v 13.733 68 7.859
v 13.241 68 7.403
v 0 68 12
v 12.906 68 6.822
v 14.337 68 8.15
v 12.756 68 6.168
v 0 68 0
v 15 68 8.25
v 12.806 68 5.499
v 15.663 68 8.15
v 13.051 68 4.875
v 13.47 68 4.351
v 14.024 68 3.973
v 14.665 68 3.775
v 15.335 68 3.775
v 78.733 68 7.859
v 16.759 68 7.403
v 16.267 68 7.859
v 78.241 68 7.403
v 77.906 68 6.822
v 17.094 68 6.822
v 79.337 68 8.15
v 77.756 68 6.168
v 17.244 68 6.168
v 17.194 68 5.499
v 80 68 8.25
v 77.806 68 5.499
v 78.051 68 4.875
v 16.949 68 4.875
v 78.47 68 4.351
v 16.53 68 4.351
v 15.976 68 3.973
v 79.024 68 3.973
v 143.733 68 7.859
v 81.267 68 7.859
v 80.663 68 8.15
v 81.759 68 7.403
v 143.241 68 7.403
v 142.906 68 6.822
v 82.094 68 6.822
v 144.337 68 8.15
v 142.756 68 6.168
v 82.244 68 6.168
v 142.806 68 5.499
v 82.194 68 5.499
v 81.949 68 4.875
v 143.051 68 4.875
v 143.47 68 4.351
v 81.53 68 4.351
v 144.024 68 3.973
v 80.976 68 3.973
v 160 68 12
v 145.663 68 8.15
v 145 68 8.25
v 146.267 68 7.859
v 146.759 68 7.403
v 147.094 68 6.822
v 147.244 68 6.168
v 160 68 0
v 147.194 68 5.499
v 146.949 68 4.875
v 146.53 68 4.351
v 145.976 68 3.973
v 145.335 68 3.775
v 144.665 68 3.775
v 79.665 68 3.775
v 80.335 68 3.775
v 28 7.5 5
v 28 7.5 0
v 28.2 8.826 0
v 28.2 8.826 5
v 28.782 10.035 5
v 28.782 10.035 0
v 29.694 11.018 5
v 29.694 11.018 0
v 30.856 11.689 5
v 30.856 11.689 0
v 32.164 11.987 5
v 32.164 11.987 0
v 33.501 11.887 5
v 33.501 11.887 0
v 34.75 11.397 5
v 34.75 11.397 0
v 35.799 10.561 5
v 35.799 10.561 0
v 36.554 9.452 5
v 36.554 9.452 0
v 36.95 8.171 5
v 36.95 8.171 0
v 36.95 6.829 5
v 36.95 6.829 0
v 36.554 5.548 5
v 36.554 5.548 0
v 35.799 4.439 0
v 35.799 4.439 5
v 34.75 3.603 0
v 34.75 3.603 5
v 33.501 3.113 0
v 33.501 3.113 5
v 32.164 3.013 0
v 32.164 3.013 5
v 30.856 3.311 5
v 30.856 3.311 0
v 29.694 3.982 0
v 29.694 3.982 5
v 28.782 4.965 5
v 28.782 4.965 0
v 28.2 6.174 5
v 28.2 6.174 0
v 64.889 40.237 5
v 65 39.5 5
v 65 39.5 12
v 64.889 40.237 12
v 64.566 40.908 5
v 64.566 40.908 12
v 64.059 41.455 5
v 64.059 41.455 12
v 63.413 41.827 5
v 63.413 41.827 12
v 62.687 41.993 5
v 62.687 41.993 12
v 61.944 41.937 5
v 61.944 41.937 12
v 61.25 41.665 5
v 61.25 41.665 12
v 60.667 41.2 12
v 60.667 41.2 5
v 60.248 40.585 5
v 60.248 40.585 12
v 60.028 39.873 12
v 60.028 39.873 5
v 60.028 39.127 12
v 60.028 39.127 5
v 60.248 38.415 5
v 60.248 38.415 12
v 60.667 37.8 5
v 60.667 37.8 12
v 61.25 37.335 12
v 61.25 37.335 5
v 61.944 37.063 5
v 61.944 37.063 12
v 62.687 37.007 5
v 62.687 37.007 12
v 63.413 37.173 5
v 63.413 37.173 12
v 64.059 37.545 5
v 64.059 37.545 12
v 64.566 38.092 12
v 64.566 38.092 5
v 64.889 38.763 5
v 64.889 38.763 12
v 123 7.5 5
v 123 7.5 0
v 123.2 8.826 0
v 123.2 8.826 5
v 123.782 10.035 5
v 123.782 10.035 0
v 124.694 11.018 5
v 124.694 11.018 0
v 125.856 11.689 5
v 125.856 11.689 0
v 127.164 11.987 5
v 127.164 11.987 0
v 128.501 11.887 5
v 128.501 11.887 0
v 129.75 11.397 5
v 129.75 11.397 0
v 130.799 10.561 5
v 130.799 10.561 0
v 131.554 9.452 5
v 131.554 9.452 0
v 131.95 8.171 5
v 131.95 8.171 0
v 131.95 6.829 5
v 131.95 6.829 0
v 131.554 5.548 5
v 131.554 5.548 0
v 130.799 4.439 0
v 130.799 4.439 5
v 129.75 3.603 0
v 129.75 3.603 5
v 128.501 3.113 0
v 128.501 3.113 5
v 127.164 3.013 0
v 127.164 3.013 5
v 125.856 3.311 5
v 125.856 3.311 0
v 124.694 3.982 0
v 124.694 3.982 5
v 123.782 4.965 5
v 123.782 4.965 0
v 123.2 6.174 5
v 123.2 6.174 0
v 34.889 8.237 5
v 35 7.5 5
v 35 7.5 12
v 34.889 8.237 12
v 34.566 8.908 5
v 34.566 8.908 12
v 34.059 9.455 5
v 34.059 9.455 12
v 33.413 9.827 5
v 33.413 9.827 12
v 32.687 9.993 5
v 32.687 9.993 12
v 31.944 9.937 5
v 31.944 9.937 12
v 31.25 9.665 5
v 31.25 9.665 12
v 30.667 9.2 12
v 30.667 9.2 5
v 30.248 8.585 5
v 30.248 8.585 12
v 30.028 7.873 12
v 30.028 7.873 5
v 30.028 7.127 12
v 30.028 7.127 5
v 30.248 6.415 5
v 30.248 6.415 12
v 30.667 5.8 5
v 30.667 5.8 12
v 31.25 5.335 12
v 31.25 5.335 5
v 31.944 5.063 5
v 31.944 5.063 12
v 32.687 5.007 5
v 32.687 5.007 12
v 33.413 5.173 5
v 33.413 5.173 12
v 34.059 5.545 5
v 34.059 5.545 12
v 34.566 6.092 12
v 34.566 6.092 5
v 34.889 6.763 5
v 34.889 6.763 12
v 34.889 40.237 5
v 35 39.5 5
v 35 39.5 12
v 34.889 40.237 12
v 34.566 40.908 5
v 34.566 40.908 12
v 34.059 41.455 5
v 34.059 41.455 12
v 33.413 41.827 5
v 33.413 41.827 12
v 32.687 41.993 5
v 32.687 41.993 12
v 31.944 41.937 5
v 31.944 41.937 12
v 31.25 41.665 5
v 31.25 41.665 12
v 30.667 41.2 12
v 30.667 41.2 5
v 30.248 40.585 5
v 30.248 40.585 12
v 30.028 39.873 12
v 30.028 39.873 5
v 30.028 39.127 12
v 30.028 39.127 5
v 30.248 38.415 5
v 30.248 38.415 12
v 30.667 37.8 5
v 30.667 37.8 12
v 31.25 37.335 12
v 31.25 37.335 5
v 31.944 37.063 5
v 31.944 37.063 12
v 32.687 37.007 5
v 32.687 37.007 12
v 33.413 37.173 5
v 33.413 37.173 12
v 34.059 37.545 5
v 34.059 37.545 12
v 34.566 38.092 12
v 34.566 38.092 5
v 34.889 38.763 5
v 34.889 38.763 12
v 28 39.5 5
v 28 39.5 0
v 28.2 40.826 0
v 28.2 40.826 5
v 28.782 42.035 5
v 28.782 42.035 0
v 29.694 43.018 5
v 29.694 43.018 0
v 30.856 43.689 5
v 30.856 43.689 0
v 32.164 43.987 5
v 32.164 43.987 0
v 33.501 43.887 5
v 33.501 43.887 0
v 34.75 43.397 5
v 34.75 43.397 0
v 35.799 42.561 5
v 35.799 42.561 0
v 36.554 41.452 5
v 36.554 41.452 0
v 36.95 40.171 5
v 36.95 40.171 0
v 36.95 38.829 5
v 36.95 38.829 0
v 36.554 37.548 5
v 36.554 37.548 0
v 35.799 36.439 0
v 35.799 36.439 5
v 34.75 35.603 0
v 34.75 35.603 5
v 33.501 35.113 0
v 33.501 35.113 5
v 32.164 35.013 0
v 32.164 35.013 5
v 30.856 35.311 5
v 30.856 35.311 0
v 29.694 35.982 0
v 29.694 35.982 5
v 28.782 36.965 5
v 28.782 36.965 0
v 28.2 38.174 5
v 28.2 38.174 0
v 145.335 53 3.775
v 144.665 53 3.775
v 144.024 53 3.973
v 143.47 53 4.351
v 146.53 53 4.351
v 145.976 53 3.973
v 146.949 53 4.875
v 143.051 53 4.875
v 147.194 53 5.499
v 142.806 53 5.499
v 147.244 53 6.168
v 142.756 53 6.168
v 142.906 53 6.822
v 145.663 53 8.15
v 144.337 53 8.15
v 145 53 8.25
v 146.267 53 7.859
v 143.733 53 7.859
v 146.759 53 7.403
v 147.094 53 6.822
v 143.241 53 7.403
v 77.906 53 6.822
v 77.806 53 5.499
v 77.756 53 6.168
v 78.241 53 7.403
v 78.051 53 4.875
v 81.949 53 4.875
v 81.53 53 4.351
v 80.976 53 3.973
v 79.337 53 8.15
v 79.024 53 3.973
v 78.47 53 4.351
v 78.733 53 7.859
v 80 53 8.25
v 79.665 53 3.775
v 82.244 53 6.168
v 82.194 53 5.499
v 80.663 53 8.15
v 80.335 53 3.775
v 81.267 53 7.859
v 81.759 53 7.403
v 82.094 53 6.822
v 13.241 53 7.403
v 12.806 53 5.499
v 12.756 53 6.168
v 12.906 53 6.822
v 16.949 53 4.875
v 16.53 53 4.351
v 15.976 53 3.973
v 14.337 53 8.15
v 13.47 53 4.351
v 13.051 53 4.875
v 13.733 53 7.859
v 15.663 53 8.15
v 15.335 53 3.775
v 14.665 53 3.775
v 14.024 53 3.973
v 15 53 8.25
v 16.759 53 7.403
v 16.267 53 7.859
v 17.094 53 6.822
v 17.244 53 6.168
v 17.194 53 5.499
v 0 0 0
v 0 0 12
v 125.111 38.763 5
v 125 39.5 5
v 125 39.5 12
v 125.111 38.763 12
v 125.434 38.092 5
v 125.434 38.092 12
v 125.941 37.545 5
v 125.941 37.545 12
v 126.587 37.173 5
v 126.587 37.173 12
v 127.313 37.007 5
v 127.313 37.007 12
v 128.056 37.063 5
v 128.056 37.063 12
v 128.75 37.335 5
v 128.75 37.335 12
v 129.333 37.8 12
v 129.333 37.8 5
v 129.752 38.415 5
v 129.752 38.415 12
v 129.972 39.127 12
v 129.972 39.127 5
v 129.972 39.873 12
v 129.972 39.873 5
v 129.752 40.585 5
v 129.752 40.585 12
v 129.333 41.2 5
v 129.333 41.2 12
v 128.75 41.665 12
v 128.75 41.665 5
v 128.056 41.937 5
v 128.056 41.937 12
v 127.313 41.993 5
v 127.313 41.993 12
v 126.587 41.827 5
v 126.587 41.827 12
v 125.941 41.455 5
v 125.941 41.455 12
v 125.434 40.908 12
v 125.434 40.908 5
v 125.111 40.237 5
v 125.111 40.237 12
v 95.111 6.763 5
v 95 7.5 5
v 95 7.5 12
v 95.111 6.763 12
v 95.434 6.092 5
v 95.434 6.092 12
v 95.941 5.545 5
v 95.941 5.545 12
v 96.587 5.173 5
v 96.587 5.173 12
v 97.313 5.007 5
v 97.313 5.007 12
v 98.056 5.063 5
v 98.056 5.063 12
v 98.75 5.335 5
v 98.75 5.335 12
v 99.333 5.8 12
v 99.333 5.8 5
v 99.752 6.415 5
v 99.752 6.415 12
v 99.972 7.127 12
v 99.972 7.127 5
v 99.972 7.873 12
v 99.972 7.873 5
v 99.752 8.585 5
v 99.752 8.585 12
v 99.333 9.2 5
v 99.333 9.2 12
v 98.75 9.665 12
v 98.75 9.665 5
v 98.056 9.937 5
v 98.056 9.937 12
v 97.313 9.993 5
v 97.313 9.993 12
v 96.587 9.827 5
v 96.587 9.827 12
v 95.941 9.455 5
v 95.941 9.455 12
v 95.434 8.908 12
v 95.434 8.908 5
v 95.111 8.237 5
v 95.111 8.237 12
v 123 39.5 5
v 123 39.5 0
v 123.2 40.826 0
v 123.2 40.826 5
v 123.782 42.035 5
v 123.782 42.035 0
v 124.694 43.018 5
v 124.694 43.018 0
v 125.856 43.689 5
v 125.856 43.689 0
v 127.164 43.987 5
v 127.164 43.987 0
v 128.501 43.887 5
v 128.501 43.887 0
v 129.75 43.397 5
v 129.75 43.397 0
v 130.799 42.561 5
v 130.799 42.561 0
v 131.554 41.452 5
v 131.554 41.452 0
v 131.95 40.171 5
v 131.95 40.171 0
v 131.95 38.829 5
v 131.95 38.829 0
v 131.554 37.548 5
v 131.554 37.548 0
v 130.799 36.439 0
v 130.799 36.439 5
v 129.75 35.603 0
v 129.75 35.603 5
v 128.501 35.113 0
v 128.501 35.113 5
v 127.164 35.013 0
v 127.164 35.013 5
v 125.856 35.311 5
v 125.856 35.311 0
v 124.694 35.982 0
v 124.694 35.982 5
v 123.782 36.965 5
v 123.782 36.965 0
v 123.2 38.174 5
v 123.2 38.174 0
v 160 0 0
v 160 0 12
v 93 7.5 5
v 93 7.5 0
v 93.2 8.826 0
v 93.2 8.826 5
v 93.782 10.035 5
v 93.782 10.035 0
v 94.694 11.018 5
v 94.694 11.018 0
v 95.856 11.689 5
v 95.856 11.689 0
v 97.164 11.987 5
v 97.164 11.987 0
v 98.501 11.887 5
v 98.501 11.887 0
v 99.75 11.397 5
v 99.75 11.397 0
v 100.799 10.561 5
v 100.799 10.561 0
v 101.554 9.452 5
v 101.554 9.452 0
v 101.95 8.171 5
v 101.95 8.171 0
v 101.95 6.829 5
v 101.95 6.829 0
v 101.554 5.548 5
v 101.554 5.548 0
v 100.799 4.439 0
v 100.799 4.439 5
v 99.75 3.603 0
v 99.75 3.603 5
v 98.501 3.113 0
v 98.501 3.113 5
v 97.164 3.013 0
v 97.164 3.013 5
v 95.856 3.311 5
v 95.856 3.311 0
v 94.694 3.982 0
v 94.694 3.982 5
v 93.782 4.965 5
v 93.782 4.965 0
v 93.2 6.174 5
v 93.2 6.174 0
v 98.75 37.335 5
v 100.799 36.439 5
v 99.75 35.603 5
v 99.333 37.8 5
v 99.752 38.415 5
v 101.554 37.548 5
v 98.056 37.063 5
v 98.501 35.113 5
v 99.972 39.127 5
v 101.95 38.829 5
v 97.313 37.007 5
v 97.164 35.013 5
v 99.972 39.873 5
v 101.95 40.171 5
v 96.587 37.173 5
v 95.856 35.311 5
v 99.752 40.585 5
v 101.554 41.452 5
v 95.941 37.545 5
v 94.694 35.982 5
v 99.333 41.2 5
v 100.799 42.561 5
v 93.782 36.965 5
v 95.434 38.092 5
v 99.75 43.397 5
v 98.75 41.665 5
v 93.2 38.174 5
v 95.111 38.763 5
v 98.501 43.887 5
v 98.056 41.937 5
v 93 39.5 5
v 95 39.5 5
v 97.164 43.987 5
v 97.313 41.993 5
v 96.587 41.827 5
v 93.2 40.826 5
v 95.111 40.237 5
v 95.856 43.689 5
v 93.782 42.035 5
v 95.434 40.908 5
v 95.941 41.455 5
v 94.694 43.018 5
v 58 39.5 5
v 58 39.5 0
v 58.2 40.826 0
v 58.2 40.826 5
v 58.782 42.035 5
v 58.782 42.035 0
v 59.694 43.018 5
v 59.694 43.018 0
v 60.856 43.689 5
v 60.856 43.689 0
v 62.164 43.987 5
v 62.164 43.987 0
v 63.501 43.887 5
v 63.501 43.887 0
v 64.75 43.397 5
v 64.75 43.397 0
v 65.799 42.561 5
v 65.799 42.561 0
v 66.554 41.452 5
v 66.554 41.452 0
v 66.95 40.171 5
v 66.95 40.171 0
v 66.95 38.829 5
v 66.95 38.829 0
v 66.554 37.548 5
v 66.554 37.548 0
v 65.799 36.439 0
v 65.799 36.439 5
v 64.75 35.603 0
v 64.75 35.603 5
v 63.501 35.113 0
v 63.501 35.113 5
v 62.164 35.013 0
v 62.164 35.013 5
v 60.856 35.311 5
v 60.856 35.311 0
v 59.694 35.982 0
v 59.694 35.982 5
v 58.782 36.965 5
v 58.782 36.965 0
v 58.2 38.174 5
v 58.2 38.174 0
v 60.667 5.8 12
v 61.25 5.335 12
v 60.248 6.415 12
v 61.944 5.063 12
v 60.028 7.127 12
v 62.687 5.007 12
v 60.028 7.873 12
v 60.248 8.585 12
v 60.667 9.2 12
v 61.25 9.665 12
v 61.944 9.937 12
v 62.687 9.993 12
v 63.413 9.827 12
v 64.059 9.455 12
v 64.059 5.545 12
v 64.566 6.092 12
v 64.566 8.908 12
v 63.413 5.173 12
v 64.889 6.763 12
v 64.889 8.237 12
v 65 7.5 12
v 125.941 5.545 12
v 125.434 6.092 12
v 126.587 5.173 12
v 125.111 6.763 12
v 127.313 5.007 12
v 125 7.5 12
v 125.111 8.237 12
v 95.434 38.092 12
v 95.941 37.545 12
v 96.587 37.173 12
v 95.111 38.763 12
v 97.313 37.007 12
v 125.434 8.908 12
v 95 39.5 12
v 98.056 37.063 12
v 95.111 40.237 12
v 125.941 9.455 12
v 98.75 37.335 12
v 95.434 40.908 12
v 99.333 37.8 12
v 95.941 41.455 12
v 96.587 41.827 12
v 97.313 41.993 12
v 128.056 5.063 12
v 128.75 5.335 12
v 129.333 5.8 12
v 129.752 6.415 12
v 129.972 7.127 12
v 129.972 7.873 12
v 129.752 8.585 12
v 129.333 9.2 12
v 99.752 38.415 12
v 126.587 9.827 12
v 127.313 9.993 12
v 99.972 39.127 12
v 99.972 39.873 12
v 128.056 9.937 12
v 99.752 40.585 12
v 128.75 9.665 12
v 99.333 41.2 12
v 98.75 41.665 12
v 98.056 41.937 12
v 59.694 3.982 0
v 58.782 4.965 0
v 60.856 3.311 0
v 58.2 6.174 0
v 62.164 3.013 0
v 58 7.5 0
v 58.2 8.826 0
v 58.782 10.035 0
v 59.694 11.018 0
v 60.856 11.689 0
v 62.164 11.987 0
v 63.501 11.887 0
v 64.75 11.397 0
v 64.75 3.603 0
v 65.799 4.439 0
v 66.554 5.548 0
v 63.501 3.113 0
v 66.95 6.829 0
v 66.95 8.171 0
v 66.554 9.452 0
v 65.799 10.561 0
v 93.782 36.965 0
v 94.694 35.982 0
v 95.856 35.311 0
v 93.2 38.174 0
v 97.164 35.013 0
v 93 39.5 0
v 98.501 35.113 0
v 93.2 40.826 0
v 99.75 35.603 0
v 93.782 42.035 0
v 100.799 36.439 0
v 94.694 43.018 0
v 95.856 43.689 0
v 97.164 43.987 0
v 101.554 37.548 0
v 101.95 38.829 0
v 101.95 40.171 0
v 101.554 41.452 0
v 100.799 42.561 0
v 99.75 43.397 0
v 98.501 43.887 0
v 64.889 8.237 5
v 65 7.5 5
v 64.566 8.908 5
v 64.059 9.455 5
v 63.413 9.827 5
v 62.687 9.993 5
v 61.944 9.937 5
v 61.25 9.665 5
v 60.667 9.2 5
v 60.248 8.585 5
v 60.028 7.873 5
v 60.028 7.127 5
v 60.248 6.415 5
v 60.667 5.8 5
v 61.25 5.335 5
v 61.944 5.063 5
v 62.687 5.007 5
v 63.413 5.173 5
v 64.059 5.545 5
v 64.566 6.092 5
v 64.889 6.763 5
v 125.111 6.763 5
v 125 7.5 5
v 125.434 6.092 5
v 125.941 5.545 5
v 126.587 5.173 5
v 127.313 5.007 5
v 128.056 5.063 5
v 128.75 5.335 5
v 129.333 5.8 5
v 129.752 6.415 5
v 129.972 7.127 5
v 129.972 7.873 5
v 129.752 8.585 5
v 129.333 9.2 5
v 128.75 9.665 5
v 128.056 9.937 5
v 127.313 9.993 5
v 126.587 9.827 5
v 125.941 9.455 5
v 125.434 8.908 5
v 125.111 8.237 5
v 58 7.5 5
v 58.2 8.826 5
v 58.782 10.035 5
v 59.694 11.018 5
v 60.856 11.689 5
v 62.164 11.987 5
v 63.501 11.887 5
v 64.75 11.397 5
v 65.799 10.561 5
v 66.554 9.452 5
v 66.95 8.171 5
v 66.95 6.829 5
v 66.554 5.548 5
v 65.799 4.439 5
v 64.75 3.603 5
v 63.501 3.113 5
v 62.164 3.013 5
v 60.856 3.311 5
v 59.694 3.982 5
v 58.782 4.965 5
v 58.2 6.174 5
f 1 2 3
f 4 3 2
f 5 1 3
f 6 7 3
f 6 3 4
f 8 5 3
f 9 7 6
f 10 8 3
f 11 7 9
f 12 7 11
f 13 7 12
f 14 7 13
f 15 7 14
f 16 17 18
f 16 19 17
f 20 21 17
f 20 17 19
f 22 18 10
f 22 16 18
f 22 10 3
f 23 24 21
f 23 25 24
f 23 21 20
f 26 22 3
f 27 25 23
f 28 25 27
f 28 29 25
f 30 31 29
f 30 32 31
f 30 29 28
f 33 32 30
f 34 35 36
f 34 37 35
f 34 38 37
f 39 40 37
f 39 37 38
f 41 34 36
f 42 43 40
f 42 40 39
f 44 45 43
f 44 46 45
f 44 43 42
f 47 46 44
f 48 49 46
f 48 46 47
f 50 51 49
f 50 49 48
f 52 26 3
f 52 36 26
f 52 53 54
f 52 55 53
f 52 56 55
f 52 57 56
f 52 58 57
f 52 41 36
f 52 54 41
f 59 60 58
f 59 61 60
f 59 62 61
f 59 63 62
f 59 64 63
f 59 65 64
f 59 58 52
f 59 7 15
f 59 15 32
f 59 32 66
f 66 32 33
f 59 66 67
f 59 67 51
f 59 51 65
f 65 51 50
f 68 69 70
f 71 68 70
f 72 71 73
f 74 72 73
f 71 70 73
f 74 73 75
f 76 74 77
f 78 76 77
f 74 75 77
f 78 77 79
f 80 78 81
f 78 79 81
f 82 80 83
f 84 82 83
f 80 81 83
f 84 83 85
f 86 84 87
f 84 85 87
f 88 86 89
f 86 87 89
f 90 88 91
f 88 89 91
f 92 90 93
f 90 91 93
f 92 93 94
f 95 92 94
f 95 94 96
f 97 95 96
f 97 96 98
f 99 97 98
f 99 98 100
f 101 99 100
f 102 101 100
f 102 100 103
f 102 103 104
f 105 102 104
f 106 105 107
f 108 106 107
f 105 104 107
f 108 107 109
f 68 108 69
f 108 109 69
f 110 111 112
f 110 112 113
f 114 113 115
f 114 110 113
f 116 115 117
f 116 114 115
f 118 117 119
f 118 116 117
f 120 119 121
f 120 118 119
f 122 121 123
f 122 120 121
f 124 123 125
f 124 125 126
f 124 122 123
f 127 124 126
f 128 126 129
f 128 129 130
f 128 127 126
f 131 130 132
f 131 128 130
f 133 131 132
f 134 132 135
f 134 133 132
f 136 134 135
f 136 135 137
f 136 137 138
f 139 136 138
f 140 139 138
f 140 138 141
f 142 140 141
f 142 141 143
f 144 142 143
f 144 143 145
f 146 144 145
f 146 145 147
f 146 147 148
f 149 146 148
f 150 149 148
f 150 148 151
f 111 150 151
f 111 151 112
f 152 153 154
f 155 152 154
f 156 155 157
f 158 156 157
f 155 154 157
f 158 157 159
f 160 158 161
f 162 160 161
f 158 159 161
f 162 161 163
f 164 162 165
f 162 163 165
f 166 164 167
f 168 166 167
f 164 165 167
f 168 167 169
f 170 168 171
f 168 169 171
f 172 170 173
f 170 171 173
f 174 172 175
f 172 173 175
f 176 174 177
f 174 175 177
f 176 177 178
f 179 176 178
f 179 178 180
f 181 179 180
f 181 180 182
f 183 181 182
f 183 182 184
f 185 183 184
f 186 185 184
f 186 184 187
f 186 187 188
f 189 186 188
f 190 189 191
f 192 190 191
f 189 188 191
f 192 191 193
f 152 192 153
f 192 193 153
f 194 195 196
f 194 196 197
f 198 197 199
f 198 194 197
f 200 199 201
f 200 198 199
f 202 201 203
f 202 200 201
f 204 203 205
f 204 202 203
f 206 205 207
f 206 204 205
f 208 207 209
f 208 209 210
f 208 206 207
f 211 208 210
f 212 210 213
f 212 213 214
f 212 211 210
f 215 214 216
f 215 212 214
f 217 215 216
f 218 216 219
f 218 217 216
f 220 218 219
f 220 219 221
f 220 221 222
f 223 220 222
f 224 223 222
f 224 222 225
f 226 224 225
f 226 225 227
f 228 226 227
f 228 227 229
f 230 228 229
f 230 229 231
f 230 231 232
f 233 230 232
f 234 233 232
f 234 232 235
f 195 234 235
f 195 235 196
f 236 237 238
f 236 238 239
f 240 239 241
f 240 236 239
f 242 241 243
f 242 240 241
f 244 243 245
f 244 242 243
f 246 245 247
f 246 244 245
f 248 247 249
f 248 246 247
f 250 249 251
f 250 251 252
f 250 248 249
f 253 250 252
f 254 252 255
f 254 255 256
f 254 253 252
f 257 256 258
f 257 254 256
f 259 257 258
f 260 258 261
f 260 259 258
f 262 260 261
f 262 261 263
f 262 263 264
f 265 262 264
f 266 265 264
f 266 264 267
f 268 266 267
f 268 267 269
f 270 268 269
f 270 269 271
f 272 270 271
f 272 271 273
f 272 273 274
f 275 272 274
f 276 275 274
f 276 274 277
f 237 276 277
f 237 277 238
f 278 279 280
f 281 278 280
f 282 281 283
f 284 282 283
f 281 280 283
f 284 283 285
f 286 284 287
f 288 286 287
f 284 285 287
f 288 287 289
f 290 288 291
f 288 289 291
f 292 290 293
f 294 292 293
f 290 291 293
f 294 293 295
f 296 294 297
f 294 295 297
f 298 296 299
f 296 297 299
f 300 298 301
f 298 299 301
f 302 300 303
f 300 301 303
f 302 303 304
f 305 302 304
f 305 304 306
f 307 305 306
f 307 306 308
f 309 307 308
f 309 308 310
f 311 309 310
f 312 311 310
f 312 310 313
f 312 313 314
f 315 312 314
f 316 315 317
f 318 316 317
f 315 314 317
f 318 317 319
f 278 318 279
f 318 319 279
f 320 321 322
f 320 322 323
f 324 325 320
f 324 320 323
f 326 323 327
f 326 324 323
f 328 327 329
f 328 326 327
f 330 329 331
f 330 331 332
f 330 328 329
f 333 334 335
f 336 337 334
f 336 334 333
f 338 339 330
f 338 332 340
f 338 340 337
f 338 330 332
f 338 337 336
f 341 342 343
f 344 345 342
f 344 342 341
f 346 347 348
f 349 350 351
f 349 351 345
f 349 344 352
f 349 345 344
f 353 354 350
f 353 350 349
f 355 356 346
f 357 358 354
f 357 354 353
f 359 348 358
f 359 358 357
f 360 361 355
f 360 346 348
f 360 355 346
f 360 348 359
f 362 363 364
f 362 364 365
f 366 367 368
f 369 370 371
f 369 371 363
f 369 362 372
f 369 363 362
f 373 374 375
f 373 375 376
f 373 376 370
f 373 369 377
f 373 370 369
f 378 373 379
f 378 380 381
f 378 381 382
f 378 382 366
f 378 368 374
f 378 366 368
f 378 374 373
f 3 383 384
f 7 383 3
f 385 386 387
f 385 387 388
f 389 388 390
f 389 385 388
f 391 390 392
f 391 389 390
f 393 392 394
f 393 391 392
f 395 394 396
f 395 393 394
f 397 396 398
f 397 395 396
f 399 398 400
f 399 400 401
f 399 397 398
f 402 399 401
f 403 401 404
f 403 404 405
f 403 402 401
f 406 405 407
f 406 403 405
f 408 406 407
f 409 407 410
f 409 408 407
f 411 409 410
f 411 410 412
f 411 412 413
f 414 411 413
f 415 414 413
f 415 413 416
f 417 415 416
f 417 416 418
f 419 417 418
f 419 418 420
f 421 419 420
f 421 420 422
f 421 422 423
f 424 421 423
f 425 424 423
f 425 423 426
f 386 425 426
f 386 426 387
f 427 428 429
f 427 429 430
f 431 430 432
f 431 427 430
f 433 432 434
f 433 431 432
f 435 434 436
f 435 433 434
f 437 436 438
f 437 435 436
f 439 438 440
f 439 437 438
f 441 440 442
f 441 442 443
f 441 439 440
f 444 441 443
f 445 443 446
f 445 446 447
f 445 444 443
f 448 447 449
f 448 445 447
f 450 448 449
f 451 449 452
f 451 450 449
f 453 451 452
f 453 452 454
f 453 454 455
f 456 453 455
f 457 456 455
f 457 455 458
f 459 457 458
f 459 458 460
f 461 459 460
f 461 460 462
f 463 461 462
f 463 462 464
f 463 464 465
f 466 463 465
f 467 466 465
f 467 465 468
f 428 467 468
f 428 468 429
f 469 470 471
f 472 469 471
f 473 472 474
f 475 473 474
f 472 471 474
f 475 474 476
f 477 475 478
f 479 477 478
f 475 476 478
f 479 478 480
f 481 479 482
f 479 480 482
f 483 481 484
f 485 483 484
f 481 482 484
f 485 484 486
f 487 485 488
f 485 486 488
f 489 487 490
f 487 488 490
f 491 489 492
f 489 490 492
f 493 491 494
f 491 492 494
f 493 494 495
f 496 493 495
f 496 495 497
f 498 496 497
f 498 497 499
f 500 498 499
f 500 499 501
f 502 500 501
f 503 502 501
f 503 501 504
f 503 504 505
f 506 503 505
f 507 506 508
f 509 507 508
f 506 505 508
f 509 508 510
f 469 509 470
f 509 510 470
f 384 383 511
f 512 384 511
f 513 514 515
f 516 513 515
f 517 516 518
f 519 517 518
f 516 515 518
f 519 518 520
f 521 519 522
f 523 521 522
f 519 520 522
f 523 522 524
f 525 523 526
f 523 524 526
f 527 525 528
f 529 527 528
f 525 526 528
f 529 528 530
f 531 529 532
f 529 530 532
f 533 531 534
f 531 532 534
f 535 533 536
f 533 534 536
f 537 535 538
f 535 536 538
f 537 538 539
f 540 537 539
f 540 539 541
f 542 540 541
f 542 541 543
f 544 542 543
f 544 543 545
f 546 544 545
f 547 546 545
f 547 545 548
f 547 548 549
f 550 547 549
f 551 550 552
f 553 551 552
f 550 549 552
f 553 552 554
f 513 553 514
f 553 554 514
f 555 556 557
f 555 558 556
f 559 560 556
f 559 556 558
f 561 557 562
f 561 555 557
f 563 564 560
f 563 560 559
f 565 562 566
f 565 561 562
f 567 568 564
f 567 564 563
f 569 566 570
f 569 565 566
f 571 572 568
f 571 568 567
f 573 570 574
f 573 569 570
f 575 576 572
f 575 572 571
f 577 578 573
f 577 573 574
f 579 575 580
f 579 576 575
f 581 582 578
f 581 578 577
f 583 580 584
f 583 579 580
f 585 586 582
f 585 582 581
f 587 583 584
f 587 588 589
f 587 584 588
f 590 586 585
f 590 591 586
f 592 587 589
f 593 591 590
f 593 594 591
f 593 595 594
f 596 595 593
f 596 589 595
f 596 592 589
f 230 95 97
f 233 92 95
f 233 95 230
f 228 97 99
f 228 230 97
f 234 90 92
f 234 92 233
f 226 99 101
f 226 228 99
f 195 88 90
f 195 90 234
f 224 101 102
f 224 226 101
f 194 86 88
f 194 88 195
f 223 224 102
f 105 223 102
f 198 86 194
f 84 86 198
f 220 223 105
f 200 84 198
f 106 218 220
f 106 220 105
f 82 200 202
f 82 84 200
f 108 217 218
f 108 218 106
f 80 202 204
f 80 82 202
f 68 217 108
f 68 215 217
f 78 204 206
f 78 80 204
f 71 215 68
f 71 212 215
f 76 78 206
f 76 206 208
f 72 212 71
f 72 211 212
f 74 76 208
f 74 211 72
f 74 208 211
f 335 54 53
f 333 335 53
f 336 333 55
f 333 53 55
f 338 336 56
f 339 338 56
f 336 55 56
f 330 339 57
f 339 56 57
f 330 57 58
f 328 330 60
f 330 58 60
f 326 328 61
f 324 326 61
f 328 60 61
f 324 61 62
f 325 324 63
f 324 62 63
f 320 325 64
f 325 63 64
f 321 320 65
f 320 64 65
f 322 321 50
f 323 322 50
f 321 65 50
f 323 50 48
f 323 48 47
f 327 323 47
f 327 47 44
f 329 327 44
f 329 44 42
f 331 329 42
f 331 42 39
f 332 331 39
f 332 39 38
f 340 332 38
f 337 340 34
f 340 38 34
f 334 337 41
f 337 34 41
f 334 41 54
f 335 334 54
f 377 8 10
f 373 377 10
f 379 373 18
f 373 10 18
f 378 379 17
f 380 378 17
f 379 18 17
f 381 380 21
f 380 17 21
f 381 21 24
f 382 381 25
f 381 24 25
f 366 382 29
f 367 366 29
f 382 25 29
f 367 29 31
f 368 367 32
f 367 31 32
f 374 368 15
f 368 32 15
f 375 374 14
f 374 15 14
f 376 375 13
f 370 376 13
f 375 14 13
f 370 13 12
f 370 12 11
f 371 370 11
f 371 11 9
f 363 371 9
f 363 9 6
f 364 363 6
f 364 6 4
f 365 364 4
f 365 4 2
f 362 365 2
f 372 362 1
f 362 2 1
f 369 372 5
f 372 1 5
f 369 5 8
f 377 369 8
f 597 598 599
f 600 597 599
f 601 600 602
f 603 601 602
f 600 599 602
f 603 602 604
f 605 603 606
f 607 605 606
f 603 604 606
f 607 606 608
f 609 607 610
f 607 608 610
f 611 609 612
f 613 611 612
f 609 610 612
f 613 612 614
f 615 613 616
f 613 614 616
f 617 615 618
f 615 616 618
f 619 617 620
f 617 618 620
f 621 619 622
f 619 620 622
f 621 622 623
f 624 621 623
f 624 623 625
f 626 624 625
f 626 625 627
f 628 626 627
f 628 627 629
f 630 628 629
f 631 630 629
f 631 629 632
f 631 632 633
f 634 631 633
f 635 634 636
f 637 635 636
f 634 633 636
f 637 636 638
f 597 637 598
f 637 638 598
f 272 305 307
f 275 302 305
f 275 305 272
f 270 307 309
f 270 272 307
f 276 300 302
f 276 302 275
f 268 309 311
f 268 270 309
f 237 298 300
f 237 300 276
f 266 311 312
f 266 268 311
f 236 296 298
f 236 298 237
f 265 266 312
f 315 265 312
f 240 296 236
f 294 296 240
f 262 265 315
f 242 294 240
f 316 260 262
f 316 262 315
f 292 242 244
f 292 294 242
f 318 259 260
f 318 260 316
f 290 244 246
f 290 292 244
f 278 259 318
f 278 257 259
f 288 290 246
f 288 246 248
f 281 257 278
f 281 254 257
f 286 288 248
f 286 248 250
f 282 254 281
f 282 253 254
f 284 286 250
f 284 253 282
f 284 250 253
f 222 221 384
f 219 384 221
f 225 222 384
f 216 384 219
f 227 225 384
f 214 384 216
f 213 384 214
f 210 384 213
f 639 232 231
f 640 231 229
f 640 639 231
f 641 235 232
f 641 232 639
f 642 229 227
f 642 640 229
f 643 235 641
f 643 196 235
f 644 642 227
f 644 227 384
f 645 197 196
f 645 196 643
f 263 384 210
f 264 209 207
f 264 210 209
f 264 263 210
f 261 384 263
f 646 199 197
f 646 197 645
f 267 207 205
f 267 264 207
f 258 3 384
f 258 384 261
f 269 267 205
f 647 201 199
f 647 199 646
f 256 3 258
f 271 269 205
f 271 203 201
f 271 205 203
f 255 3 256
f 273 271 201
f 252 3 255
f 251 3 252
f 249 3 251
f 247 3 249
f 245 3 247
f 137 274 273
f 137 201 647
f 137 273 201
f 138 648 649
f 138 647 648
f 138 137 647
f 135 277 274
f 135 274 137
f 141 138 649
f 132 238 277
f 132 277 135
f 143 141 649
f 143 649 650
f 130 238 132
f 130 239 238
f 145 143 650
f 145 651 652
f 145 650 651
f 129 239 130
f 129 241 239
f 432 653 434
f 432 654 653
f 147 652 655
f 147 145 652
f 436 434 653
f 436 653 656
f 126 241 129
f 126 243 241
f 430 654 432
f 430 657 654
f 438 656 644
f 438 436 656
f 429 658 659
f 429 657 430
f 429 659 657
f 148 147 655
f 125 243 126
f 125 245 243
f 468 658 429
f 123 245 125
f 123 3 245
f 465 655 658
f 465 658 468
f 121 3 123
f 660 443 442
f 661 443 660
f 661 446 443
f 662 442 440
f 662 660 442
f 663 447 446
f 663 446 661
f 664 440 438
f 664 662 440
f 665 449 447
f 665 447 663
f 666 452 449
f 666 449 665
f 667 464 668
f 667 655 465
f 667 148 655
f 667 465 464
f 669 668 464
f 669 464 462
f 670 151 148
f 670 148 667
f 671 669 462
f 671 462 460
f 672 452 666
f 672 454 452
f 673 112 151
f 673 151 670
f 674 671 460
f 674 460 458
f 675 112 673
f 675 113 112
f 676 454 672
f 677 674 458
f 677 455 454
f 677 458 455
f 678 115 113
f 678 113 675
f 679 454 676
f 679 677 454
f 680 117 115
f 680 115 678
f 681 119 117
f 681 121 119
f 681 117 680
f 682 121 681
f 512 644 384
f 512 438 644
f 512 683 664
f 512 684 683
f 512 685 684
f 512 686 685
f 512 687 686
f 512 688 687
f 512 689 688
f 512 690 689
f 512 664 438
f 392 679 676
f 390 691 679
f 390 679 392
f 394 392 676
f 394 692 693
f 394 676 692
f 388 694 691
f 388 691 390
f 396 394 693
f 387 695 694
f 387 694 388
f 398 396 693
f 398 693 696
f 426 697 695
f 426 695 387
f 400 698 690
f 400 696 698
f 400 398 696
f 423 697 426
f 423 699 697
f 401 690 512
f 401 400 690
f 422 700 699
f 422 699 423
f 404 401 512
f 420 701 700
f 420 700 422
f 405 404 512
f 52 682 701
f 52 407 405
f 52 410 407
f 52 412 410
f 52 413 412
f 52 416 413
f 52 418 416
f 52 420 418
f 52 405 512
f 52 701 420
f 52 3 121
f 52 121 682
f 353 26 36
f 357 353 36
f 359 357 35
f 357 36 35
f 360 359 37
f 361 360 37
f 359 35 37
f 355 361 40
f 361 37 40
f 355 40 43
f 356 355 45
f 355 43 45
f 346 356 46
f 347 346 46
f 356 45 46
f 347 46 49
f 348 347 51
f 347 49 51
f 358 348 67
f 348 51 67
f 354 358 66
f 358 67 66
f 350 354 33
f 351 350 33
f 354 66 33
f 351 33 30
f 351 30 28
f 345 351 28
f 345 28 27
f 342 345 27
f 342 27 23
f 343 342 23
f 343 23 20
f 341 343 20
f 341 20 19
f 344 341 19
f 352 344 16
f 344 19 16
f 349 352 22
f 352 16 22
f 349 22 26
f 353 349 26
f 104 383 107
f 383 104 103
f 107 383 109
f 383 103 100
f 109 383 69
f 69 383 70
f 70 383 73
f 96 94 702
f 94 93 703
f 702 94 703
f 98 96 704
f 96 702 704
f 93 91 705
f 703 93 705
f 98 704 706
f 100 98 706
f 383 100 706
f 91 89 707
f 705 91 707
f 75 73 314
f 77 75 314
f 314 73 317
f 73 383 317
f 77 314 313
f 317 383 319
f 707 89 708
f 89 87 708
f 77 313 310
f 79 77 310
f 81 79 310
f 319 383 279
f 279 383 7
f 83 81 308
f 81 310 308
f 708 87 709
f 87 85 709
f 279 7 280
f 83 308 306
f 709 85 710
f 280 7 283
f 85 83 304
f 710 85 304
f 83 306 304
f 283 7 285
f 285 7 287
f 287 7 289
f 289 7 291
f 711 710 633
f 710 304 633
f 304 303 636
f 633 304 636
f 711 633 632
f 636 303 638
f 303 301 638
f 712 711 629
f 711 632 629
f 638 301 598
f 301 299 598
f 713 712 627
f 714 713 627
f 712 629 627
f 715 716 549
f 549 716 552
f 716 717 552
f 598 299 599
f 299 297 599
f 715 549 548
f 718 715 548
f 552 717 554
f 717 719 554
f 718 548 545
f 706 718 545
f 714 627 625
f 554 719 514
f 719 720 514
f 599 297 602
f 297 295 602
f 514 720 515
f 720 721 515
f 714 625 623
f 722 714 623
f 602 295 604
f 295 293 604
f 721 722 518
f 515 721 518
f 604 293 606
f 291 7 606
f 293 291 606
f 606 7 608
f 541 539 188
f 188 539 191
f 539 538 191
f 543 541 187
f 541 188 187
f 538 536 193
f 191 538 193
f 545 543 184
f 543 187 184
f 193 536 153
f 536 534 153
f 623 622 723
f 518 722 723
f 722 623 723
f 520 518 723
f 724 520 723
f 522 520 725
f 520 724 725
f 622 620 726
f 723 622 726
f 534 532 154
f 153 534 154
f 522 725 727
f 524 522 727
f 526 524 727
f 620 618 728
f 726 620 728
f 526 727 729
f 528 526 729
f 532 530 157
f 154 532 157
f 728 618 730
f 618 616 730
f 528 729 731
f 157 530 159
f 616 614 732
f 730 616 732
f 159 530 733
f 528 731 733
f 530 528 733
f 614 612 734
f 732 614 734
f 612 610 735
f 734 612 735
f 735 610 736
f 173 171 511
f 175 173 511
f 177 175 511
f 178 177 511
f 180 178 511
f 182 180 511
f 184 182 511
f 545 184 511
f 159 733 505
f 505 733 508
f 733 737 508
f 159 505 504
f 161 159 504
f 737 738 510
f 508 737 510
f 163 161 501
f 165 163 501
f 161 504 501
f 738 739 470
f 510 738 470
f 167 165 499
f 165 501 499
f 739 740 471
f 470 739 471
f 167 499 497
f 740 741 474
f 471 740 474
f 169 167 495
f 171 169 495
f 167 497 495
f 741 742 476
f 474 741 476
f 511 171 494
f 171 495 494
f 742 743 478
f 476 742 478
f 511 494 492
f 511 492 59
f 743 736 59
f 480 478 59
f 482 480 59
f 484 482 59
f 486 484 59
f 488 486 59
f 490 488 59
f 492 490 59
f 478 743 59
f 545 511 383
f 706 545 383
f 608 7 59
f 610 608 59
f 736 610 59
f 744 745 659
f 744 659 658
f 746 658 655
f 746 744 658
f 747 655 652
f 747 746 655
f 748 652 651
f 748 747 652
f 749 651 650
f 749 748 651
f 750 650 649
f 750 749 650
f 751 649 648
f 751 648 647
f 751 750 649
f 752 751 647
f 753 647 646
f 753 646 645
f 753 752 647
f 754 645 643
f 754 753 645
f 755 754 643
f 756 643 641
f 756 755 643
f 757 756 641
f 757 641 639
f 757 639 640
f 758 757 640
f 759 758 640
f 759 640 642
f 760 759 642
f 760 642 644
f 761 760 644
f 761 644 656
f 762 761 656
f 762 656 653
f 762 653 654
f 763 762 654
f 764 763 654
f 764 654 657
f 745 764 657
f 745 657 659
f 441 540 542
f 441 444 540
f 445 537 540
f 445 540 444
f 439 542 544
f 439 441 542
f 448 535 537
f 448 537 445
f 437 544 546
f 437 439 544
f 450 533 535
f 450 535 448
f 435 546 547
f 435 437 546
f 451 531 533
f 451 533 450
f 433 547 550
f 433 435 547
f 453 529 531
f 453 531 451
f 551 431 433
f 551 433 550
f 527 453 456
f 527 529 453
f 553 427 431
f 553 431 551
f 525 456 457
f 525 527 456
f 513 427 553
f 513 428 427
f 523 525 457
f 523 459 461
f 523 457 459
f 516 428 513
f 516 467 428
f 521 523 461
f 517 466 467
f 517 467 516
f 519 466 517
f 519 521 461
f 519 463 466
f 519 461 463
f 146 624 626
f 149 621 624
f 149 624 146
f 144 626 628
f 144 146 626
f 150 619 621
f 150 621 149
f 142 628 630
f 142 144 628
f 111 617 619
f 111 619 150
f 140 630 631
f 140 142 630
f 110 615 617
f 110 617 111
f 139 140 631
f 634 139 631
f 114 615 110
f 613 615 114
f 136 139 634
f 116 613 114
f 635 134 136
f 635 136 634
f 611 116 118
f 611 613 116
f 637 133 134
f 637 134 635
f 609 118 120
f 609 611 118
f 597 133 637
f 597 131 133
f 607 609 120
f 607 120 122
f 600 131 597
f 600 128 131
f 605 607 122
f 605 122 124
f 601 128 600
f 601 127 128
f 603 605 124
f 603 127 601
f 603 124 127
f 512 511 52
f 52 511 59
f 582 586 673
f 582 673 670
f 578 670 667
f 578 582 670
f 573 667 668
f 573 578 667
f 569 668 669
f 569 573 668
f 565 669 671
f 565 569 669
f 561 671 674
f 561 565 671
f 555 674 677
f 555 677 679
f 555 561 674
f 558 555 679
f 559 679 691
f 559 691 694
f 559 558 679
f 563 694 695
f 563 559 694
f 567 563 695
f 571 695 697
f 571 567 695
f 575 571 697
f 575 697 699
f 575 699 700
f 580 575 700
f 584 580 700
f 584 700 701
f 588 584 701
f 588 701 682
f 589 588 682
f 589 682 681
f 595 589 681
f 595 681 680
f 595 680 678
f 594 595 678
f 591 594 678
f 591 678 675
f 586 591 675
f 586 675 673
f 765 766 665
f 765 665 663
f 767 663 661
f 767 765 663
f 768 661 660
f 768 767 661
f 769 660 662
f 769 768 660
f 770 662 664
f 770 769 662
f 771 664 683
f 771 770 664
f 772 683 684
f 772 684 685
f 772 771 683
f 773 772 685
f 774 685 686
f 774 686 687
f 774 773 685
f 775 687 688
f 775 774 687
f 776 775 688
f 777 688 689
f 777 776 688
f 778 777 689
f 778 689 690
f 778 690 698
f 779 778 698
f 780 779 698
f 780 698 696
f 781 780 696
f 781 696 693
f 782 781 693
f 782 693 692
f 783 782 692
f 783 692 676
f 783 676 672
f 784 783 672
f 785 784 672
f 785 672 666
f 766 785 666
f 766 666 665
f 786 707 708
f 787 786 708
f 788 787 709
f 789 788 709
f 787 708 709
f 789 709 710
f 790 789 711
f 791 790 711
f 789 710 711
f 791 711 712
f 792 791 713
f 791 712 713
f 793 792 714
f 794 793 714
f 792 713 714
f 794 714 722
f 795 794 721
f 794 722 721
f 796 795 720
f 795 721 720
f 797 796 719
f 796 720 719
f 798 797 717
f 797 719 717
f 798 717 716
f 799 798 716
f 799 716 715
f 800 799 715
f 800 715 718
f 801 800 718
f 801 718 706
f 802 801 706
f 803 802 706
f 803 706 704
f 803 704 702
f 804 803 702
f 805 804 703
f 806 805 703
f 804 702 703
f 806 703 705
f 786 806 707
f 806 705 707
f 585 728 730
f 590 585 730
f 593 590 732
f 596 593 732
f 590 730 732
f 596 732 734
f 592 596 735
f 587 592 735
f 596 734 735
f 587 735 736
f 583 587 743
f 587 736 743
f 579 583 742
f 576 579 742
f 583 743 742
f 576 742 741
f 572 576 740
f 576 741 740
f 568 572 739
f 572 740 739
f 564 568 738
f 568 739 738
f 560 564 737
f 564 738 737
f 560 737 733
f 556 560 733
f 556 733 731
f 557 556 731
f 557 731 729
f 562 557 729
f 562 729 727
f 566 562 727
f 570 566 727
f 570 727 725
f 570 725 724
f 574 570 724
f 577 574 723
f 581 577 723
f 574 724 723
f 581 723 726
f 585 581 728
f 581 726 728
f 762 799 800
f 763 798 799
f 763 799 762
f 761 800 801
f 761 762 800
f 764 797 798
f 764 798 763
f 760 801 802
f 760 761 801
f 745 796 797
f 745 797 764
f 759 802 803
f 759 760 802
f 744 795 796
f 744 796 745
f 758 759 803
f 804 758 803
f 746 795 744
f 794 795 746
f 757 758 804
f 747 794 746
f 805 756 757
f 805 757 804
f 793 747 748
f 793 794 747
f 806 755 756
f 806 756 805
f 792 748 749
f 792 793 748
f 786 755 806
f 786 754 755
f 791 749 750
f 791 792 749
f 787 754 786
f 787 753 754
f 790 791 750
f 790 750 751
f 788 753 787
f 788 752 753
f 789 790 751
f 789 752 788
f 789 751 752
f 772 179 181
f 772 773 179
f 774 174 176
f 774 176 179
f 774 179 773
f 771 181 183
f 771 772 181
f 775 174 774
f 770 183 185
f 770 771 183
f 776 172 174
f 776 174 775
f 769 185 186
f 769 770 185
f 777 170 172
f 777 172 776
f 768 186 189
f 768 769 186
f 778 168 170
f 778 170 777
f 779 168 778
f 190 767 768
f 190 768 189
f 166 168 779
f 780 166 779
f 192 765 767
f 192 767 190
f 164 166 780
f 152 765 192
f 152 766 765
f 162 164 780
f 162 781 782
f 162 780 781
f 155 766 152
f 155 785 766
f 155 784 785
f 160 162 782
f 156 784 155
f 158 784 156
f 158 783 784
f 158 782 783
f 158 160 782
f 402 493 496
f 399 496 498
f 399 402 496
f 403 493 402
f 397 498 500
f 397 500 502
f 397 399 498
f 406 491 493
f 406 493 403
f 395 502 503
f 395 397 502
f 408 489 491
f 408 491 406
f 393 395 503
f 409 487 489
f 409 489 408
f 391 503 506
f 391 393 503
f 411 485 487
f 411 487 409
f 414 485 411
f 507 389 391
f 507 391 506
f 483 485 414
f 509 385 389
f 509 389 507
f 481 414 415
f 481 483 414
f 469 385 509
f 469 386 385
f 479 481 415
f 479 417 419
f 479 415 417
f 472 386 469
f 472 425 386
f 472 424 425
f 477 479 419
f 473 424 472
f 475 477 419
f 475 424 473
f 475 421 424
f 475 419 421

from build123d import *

# Parameters (mm, degrees)
ESQUISSE1_W             = 160
ESQUISSE1_H             = 68
ESQUISSE1_R             = 2.5
BOSS_EXTRU_1_DEPTH      = 12
ESQUISSE2_R             = 2.25
ENL_V_MAT_EXTRU_1_DEPTH = 15
ESQUISSE3_R             = 4.5
ENL_V_MAT_EXTRU_2_DEPTH = 5


with BuildPart() as part:
    # Esquisse1 → Boss.-Extru.1 (new body)
    with BuildSketch(Plane.XY):
        with Locations((80, 34)):
            Rectangle(ESQUISSE1_W, ESQUISSE1_H)
        with Locations((62.5, 39.5)):
            Circle(ESQUISSE1_R, mode=Mode.SUBTRACT)
        with Locations((32.5, 39.5)):
            Circle(ESQUISSE1_R, mode=Mode.SUBTRACT)
        with Locations((32.5, 7.5)):
            Circle(ESQUISSE1_R, mode=Mode.SUBTRACT)
        with Locations((62.5, 7.5)):
            Circle(ESQUISSE1_R, mode=Mode.SUBTRACT)
        with Locations(Location((97.5, 7.5, 0), (0, 0, 180))):
            Circle(ESQUISSE1_R, mode=Mode.SUBTRACT)
        with Locations(Location((127.5, 7.5, 0), (0, 0, 180))):
            Circle(ESQUISSE1_R, mode=Mode.SUBTRACT)
        with Locations(Location((127.5, 39.5, 0), (0, 0, 180))):
            Circle(ESQUISSE1_R, mode=Mode.SUBTRACT)
        with Locations(Location((97.5, 39.5, 0), (0, 0, 180))):
            Circle(ESQUISSE1_R, mode=Mode.SUBTRACT)
    extrude(amount=BOSS_EXTRU_1_DEPTH)

    # Esquisse2 → Enlèv. mat.-Extru.1 (cut)
    with BuildSketch(Plane(origin=(0, 68, 0), x_dir=(1, 0, 0), z_dir=(0, 1, 0))):
        with Locations(Location((15, -6, 0), (0, 0, 270))):
            Circle(ESQUISSE2_R)
        with Locations(Location((80, -6, 0), (0, 0, 270))):
            Circle(ESQUISSE2_R)
        with Locations(Location((145, -6, 0), (0, 0, 270))):
            Circle(ESQUISSE2_R)
    extrude(amount=-ENL_V_MAT_EXTRU_1_DEPTH, mode=Mode.SUBTRACT)

    # Esquisse3 → Enlèv. mat.-Extru.2 (cut)
    with BuildSketch(Plane(origin=(0, 0, 0), x_dir=(-1, 0, 0), z_dir=(0, 0, -1))):
        with Locations((-127.5, 39.5)):
            Circle(ESQUISSE3_R)
        with Locations((-127.5, 7.5)):
            Circle(ESQUISSE3_R)
        with Locations((-97.5, 39.5)):
            Circle(ESQUISSE3_R)
        with Locations((-62.5, 39.5)):
            Circle(ESQUISSE3_R)
        with Locations((-97.5, 7.5)):
            Circle(ESQUISSE3_R)
        with Locations((-62.5, 7.5)):
            Circle(ESQUISSE3_R)
        with Locations((-32.5, 7.5)):
            Circle(ESQUISSE3_R)
        with Locations((-32.5, 39.5)):
            Circle(ESQUISSE3_R)
    extrude(amount=-ENL_V_MAT_EXTRU_2_DEPTH, mode=Mode.SUBTRACT)


solid = part.part
